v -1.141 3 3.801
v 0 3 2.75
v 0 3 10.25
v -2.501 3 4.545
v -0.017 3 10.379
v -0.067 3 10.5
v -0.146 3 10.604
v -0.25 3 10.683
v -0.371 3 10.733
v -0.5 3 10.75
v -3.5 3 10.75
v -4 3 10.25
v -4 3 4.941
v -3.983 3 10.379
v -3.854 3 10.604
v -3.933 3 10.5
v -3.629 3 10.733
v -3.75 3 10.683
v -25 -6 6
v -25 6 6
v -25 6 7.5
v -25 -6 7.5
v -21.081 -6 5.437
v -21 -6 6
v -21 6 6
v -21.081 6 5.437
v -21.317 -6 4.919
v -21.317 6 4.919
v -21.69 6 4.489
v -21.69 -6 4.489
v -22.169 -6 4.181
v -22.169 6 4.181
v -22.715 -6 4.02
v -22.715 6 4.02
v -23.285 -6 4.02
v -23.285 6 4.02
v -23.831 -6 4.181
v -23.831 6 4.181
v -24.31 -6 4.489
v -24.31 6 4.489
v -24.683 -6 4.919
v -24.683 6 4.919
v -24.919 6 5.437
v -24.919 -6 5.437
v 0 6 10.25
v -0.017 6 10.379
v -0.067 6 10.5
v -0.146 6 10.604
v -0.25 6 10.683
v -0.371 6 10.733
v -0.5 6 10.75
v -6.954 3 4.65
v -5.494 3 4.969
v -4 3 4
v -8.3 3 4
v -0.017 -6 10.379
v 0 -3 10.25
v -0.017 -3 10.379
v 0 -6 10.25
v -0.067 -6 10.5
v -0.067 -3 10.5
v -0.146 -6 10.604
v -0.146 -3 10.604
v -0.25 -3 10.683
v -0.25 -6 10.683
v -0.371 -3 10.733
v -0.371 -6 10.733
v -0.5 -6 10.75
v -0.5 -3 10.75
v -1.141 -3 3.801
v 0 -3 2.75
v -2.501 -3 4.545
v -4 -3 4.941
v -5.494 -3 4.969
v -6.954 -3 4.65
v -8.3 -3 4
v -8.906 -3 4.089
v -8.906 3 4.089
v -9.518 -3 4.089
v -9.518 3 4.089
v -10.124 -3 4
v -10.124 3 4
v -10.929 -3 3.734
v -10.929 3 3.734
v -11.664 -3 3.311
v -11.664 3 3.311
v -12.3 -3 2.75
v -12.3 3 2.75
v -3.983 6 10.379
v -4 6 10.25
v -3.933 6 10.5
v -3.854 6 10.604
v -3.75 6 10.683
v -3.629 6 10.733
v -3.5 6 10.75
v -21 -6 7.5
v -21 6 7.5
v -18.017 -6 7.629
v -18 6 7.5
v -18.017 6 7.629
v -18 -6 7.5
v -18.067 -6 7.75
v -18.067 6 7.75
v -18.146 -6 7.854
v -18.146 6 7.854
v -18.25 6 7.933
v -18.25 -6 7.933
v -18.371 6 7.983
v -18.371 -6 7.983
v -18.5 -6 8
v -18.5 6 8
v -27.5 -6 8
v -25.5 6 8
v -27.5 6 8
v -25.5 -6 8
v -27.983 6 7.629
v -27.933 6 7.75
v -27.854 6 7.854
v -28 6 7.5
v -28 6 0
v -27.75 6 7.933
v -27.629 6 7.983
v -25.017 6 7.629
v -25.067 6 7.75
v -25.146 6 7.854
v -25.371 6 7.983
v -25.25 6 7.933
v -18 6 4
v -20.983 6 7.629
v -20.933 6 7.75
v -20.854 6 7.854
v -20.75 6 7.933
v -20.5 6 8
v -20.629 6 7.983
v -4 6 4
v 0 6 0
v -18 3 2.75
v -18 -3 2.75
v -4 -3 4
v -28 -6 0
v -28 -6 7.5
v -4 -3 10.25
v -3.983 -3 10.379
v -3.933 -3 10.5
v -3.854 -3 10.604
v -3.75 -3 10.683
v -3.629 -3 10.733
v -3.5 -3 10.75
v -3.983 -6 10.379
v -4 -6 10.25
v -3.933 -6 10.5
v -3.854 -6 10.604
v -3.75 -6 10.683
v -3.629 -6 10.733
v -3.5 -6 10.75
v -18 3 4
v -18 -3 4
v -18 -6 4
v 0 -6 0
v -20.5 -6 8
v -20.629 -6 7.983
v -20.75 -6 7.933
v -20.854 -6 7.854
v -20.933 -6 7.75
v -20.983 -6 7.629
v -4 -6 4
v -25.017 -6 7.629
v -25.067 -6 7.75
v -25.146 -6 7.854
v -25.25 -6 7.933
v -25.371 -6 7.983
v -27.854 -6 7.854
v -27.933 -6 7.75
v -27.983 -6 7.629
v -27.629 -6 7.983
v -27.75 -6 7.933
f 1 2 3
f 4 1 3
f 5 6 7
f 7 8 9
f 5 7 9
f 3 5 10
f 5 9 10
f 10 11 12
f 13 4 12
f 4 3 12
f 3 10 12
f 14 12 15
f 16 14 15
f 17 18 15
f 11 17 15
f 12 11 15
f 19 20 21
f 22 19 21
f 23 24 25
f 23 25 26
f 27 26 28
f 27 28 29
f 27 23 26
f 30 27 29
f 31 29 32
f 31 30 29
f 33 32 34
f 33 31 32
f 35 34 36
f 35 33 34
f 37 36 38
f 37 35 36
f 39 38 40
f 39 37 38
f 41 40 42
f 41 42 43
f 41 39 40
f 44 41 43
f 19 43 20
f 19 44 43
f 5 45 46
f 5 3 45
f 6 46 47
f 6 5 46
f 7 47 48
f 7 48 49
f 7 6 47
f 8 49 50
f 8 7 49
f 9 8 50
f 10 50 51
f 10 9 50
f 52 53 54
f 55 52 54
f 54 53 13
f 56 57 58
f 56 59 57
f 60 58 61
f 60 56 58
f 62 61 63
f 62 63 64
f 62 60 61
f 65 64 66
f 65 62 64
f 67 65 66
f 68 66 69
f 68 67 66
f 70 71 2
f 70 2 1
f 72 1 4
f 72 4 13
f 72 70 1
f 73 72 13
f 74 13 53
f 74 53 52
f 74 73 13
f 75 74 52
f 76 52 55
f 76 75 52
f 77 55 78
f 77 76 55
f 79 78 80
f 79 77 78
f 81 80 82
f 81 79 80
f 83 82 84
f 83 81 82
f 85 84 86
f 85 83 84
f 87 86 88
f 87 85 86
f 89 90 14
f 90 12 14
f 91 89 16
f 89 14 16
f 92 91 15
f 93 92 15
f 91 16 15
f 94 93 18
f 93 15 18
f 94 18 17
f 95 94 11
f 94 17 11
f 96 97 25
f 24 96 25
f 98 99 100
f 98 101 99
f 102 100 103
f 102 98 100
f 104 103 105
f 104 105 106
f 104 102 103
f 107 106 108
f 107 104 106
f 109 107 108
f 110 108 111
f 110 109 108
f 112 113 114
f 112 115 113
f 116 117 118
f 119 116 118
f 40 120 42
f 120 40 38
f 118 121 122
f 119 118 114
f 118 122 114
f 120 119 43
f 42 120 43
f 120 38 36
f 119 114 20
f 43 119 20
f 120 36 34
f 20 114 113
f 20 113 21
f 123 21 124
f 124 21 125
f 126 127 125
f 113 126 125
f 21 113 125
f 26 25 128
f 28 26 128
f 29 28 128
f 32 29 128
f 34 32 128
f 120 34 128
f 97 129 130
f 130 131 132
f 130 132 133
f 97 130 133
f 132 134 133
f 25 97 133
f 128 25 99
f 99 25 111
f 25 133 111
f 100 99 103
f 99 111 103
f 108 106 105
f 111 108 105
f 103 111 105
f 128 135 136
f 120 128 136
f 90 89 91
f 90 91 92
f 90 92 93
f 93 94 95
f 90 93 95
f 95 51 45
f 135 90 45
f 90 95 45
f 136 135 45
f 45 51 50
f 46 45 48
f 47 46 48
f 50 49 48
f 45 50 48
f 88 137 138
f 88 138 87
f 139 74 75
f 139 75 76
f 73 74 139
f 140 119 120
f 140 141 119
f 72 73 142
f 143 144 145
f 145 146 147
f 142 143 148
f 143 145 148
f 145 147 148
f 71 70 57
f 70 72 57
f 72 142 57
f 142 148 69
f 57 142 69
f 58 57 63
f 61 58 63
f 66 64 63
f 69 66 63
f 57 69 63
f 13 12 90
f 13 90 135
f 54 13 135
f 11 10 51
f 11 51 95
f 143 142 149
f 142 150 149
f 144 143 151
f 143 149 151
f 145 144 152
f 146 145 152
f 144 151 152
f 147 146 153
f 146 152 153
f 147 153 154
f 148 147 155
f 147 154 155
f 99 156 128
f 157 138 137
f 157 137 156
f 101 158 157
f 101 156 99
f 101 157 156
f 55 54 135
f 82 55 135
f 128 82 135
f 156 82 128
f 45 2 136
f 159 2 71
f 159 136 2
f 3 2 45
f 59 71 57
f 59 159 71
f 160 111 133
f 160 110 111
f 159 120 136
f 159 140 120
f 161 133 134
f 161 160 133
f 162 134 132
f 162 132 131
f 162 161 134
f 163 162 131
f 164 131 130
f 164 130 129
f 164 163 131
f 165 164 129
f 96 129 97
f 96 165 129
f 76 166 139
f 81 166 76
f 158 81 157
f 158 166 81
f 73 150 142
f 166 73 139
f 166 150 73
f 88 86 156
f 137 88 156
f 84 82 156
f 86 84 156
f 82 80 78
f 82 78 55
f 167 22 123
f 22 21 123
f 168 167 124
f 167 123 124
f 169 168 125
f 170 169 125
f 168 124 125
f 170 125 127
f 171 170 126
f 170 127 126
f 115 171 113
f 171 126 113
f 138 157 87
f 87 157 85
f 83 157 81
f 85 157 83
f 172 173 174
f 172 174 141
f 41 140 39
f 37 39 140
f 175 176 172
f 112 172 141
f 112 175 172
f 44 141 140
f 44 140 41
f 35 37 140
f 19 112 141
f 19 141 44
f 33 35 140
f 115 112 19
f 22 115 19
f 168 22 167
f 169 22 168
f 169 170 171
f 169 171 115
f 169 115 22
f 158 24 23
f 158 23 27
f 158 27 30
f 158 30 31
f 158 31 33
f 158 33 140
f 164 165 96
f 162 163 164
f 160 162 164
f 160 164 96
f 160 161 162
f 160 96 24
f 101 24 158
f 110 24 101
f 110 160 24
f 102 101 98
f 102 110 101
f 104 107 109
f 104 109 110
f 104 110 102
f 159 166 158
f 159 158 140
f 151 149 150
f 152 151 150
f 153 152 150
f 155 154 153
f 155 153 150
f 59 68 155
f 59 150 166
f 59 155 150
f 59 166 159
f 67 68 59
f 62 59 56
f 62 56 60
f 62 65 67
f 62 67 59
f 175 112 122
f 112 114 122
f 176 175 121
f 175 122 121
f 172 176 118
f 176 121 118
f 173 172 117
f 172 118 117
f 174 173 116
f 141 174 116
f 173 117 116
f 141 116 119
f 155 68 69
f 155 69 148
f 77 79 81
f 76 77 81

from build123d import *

# Parameters (mm, degrees)
F1_DEPTH = 6
F2_W     = 14
F2_H     = 6
F2_W_2   = 4
F3_DEPTH = 8
F5_DEPTH = 3
F6_R     = 0.5


with BuildPart() as f1:
    # F0 (on Front) → F1 (new body, symmetric)
    with BuildSketch(Plane.XZ):
        with BuildLine():
            Line((-28, 0), (0, 0))
            Line((0, 0), (0, 10.75))
            Line((0, 10.75), (-4, 10.75))
            Line((-4, 10.75), (-4, 4))
            Line((-4, 4), (-18, 4))
            Line((-18, 4), (-18, 8))
            Line((-18, 8), (-21, 8))
            Line((-21, 8), (-21, 6))
            ThreePointArc((-21, 6), (-23, 4), (-25, 6))
            Line((-25, 6), (-25, 8))
            Line((-25, 8), (-28, 8))
            Line((-28, 8), (-28, 0))
        make_face()
    extrude(amount=F1_DEPTH, both=True)

    # F2 (on face) → F3 (cut)
    with BuildSketch(Plane.XY.offset(10.75)):
        with Locations((-11, 0)):
            Rectangle(F2_W, F2_H)
        with Locations((-2, 0)):
            Rectangle(F2_W_2, F2_H)
    extrude(amount=-F3_DEPTH, mode=Mode.SUBTRACT)

    # F4 (on Front) → F5 (join, symmetric)
    with BuildSketch(Plane.XZ):
        with BuildLine():
            Line((-12.3, 2.75), (0, 2.75))
            ThreePointArc((0, 2.75), (-3.916003, 4.928739), (-8.3, 4))
            ThreePointArc((-8.3, 4), (-10.466716, 3.90849), (-12.3, 2.75))
        make_face()
    extrude(amount=F5_DEPTH, both=True)

    # F6
    f6_edges = [f1.edges().sort_by_distance(p)[0] for p in [
        (-21, 0, 8),
        (-25, 0, 8),
        (-28, 0, 8),
        (-18, 0, 8),
        (0, -4.5, 10.75),
        (0, 4.5, 10.75),
        (-4, 4.5, 10.75),
        (-4, -4.5, 10.75),
    ]]
    fillet(f6_edges, radius=F6_R)


solid = f1.part
